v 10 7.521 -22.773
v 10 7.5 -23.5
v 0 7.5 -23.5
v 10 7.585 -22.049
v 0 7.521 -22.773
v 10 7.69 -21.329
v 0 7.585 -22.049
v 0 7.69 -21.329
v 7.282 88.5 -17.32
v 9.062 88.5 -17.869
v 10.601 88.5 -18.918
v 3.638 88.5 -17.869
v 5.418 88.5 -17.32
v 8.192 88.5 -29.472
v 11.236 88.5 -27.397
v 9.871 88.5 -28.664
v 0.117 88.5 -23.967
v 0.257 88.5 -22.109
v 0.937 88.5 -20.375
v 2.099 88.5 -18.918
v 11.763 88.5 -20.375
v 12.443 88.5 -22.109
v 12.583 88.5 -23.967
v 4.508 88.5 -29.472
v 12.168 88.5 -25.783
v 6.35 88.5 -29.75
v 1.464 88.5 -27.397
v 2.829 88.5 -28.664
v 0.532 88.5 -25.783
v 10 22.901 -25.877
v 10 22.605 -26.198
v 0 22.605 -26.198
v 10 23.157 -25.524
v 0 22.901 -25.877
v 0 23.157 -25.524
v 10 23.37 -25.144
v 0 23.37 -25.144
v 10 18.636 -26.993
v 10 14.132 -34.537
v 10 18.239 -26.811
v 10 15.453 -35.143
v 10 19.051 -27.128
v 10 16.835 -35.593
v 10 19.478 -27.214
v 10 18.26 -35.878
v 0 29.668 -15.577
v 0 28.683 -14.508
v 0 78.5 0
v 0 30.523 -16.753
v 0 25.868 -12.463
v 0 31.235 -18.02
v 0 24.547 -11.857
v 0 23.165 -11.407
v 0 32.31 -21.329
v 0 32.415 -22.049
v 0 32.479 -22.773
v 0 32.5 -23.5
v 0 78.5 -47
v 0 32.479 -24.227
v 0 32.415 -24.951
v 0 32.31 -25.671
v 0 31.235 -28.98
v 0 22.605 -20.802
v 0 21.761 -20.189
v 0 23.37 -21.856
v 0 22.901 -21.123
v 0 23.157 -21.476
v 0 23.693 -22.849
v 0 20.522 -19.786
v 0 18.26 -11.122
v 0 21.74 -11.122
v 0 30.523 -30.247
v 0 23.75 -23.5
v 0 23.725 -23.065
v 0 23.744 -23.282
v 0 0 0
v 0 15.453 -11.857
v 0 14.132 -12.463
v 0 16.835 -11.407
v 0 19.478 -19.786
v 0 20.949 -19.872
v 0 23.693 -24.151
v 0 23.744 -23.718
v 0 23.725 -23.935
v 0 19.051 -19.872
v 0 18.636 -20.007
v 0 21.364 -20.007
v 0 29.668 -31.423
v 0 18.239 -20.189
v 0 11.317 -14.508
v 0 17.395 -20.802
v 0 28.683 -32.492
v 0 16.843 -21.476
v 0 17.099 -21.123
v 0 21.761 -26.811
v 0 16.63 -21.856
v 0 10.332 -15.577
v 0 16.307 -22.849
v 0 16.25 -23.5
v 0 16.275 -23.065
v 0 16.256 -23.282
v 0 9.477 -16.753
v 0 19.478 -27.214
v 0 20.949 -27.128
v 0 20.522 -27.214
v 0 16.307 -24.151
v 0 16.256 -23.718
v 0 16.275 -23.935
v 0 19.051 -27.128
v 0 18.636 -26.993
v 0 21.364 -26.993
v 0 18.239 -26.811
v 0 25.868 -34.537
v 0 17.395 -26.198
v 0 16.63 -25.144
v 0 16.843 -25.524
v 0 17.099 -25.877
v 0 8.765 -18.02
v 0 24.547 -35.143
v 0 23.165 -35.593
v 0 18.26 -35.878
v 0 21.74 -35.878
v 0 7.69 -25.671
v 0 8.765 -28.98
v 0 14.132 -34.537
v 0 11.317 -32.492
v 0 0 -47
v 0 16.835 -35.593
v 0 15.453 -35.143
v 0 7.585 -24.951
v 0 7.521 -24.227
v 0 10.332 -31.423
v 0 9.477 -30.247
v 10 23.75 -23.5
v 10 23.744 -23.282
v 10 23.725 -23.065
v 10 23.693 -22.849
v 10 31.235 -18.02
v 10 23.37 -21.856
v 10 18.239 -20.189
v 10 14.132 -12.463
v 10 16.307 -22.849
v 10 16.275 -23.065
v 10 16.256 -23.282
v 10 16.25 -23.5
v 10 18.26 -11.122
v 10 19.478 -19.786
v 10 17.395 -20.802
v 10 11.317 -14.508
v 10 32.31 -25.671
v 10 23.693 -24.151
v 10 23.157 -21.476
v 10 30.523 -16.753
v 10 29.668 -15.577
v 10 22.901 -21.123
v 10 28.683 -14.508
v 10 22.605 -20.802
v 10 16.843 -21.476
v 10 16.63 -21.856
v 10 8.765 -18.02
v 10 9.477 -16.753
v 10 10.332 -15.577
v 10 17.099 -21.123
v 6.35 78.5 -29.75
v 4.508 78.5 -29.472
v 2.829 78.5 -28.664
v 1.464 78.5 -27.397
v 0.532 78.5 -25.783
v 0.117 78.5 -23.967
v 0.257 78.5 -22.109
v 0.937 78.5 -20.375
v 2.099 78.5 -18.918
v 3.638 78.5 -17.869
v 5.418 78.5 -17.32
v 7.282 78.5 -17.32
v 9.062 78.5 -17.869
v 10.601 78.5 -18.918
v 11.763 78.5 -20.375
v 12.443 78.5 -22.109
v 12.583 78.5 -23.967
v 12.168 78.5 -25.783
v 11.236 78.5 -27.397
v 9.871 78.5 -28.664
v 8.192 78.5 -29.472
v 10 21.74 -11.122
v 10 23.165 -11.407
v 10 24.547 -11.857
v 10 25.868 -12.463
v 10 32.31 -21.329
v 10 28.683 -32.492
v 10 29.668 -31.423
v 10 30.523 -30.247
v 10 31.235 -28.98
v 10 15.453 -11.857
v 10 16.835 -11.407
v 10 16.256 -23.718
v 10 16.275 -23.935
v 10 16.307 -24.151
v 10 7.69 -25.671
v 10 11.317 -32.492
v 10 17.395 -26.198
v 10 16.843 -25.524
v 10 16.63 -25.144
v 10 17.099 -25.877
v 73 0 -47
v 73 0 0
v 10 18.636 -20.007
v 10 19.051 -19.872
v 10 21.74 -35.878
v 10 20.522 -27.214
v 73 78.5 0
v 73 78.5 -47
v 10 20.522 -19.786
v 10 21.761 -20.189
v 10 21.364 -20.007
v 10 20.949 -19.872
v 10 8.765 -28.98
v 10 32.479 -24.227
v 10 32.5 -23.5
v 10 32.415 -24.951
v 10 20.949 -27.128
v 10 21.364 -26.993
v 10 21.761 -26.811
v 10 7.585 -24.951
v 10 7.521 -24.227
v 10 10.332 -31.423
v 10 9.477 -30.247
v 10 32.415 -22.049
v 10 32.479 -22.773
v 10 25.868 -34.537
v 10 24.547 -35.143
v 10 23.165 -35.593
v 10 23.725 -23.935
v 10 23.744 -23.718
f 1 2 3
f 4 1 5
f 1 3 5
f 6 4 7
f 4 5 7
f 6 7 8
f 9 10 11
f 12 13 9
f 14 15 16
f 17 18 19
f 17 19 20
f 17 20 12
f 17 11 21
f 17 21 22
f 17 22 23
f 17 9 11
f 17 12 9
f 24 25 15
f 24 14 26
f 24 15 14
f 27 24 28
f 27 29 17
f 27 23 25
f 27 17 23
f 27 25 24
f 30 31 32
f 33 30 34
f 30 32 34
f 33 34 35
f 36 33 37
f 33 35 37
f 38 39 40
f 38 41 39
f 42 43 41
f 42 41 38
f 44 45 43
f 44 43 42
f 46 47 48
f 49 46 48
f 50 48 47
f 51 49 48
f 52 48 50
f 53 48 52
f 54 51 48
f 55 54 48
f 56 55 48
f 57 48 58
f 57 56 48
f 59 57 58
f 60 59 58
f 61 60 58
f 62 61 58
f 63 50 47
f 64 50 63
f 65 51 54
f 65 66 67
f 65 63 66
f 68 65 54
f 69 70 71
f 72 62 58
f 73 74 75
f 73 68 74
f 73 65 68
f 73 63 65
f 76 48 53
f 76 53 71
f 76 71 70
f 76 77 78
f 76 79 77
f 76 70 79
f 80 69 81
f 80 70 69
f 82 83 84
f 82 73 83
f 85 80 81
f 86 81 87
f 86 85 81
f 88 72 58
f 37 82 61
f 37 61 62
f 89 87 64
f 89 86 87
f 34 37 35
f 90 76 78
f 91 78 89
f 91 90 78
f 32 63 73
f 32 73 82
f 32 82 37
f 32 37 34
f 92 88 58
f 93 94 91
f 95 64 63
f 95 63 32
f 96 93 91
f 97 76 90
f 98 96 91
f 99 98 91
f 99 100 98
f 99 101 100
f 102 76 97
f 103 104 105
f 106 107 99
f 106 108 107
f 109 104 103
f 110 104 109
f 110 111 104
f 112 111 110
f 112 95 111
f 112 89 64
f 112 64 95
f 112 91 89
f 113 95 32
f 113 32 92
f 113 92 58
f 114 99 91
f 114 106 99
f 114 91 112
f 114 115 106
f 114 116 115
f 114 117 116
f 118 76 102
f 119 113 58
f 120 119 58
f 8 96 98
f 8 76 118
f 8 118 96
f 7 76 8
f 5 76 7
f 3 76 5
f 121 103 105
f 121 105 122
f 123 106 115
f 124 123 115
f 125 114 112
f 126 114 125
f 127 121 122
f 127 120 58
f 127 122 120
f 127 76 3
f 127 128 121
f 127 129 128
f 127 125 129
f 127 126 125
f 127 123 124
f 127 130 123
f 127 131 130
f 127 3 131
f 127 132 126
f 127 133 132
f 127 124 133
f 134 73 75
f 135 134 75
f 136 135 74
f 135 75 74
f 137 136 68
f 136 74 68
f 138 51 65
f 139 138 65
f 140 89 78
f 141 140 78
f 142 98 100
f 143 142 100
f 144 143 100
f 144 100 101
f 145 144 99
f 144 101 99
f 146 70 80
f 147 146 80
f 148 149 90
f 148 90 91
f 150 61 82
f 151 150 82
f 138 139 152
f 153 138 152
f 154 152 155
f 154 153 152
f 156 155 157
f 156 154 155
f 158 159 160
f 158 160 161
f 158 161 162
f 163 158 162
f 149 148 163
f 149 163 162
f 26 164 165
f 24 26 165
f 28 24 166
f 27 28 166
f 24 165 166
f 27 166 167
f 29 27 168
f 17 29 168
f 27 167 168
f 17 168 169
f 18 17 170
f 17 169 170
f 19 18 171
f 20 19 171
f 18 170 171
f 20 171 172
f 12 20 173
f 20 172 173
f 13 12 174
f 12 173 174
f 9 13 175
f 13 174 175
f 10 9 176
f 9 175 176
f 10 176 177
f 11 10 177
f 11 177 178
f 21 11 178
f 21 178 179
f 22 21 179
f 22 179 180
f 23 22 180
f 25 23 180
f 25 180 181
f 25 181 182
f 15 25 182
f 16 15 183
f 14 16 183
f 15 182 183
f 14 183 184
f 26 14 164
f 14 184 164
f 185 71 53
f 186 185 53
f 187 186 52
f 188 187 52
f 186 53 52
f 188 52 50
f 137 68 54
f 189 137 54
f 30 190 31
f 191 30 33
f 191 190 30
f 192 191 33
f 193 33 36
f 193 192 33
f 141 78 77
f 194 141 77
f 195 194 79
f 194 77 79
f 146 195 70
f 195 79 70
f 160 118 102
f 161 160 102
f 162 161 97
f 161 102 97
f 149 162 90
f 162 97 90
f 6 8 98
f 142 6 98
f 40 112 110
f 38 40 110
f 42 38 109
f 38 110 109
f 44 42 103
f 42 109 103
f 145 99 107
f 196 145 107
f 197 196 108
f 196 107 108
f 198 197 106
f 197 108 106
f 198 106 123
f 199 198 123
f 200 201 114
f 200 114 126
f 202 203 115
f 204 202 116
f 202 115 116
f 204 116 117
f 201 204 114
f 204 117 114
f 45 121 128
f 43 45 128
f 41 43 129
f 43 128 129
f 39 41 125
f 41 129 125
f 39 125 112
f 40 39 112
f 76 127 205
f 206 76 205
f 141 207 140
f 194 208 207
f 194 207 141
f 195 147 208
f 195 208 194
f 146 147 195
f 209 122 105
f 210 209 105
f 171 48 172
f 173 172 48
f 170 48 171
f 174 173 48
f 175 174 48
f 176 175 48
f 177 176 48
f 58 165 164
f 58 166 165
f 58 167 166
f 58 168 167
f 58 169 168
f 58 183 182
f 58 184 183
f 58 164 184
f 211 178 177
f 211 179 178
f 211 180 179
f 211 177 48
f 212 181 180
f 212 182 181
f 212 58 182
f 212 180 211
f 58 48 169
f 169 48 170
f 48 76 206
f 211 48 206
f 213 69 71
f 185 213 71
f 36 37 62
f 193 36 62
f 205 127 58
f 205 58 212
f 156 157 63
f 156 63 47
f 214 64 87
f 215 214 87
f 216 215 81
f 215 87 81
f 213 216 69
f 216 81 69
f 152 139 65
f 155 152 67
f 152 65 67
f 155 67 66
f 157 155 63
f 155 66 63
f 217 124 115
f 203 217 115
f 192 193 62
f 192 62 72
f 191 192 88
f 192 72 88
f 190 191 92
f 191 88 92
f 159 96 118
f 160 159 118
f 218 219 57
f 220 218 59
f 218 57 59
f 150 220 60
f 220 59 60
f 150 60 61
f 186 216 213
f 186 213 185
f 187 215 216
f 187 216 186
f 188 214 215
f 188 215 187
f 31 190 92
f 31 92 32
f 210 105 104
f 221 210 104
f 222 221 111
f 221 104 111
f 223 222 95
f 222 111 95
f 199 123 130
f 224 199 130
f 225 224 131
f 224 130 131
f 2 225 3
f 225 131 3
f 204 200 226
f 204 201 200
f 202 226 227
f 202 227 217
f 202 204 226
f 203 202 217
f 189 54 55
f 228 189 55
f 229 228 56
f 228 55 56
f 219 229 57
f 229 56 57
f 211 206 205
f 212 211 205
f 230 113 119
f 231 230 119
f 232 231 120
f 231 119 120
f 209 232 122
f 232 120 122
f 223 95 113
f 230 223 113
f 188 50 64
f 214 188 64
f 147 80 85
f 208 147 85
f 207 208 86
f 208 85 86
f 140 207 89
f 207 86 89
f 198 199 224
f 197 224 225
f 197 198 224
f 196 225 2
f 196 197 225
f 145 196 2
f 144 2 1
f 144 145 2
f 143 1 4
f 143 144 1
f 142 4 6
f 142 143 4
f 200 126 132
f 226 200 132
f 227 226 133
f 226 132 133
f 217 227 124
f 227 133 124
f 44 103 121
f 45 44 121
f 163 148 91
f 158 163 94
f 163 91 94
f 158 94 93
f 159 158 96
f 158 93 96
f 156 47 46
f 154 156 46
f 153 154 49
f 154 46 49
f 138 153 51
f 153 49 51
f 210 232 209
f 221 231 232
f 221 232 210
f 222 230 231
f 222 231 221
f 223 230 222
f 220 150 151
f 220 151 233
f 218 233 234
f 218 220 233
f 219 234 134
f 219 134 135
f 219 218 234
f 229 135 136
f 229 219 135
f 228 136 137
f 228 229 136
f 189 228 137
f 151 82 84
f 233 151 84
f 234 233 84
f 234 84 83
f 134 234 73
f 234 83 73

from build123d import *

# Parameters (mm, degrees)
SKETCH1_W           = 73
SKETCH1_H           = 47
BOSS_EXTRUDE1_DEPTH = 78.5
SKETCH2_R           = 6.25
BOSS_EXTRUDE2_DEPTH = 10
CUT_EXTRUDE1_DEPTH  = 10


with BuildPart() as part:
    # Sketch1 → Boss-Extrude1 (new body)
    with BuildSketch(Plane(origin=(0, 0, 0), x_dir=(1, 0, 0), z_dir=(0, 1, 0))):
        with Locations((36.5, 23.5)):
            Rectangle(SKETCH1_W, SKETCH1_H)
    extrude(amount=BOSS_EXTRUDE1_DEPTH)

    # Sketch2 → Boss-Extrude2 (add)
    with BuildSketch(Plane(origin=(0, 78.5, 0), x_dir=(1, 0, 0), z_dir=(0, 1, 0))):
        with Locations(Location((6.35, 23.5, 0), (0, 0, 90))):
            Circle(SKETCH2_R)
    extrude(amount=BOSS_EXTRUDE2_DEPTH)

    # Sketch3 → Cut-Extrude1 (cut)
    with BuildSketch(Plane.ZY):
        with BuildLine():
            ThreePointArc((-21.329397779, 32.310096913), (-22.410553216, 32.452433726), (-23.5, 32.5))
            Line((-23.5, 32.5), (-23.5, 23.75))
            ThreePointArc((-23.5, 23.75), (-23.173165965, 23.735730118), (-22.848819334, 23.693029074))
            Line((-22.848819334, 23.693029074), (-21.329397779, 32.310096913))
        make_face()
        with BuildLine():
            Line((-23.5, 23.75), (-23.5, 32.5))
            ThreePointArc((-23.5, 32.5), (-24.589446784, 32.452433726), (-25.670602221, 32.310096913))
            Line((-25.670602221, 32.310096913), (-24.151180666, 23.693029074))
            ThreePointArc((-24.151180666, 23.693029074), (-23.826834035, 23.735730118), (-23.5, 23.75))
        make_face()
        with BuildLine():
            Line((-18.020360665, 31.234925579), (-21.8561082, 23.370477674))
            ThreePointArc((-21.8561082, 23.370477674), (-21.295805304, 23.033813729), (-20.802475749, 22.604968889))
            Line((-20.802475749, 22.604968889), (-14.508252496, 28.683229631))
            ThreePointArc((-14.508252496, 28.683229631), (-16.152684346, 30.11271243), (-18.020360665, 31.234925579))
        make_face()
        with BuildLine():
            Line((-12.463155089, 25.868394535), (-20.188946527, 21.76051836))
            ThreePointArc((-20.188946527, 21.76051836), (-19.933538064, 21.158813729), (-19.786494742, 20.521899129))
            Line((-19.786494742, 20.521899129), (-11.121649141, 21.739663762))
            ThreePointArc((-11.121649141, 21.739663762), (-11.611793546, 23.86271243), (-12.463155089, 25.868394535))
        make_face()
        with BuildLine():
            Line((-11.121649141, 18.260336238), (-19.786494742, 19.478100871))
            ThreePointArc((-19.786494742, 19.478100871), (-19.933538064, 18.841186271), (-20.188946527, 18.23948164))
            Line((-20.188946527, 18.23948164), (-12.463155089, 14.131605465))
            ThreePointArc((-12.463155089, 14.131605465), (-11.611793546, 16.13728757), (-11.121649141, 18.260336238))
        make_face()
        with BuildLine():
            Line((-21.8561082, 16.629522326), (-18.020360665, 8.765074421))
            ThreePointArc((-18.020360665, 8.765074421), (-16.152684346, 9.88728757), (-14.508252496, 11.316770369))
            Line((-14.508252496, 11.316770369), (-20.802475749, 17.395031111))
            ThreePointArc((-20.802475749, 17.395031111), (-21.295805304, 16.966186271), (-21.8561082, 16.629522326))
        make_face()
        with BuildLine():
            Line((-23.5, 16.25), (-23.5, 7.5))
            ThreePointArc((-23.5, 7.5), (-22.410553216, 7.547566274), (-21.329397779, 7.689903087))
            Line((-21.329397779, 7.689903087), (-22.848819334, 16.306970926))
            ThreePointArc((-22.848819334, 16.306970926), (-23.173165965, 16.264269882), (-23.5, 16.25))
        make_face()
        with BuildLine():
            ThreePointArc((-25.670602221, 7.689903087), (-24.589446784, 7.547566274), (-23.5, 7.5))
            Line((-23.5, 7.5), (-23.5, 16.25))
            ThreePointArc((-23.5, 16.25), (-23.826834035, 16.264269882), (-24.151180666, 16.306970926))
            Line((-24.151180666, 16.306970926), (-25.670602221, 7.689903087))
        make_face()
        with BuildLine():
            ThreePointArc((-32.491747504, 11.316770369), (-30.847315654, 9.88728757), (-28.979639335, 8.765074421))
            Line((-28.979639335, 8.765074421), (-25.1438918, 16.629522326))
            ThreePointArc((-25.1438918, 16.629522326), (-25.704194696, 16.966186271), (-26.197524251, 17.395031111))
            Line((-26.197524251, 17.395031111), (-32.491747504, 11.316770369))
        make_face()
        with BuildLine():
            Line((-34.536844911, 14.131605465), (-26.811053473, 18.23948164))
            ThreePointArc((-26.811053473, 18.23948164), (-27.066461936, 18.841186271), (-27.213505258, 19.478100871))
            Line((-27.213505258, 19.478100871), (-35.878350859, 18.260336238))
            ThreePointArc((-35.878350859, 18.260336238), (-35.388206454, 16.13728757), (-34.536844911, 14.131605465))
        make_face()
        with BuildLine():
            Line((-35.878350859, 21.739663762), (-27.213505258, 20.521899129))
            ThreePointArc((-27.213505258, 20.521899129), (-27.066461936, 21.158813729), (-26.811053473, 21.76051836))
            Line((-26.811053473, 21.76051836), (-34.536844911, 25.868394535))
            ThreePointArc((-34.536844911, 25.868394535), (-35.388206454, 23.86271243), (-35.878350859, 21.739663762))
        make_face()
        with BuildLine():
            Line((-32.491747504, 28.683229631), (-26.197524251, 22.604968889))
            ThreePointArc((-26.197524251, 22.604968889), (-25.704194696, 23.033813729), (-25.1438918, 23.370477674))
            Line((-25.1438918, 23.370477674), (-28.979639335, 31.234925579))
            ThreePointArc((-28.979639335, 31.234925579), (-30.847315654, 30.11271243), (-32.491747504, 28.683229631))
        make_face()
    extrude(amount=-CUT_EXTRUDE1_DEPTH, mode=Mode.SUBTRACT)


solid = part.part
